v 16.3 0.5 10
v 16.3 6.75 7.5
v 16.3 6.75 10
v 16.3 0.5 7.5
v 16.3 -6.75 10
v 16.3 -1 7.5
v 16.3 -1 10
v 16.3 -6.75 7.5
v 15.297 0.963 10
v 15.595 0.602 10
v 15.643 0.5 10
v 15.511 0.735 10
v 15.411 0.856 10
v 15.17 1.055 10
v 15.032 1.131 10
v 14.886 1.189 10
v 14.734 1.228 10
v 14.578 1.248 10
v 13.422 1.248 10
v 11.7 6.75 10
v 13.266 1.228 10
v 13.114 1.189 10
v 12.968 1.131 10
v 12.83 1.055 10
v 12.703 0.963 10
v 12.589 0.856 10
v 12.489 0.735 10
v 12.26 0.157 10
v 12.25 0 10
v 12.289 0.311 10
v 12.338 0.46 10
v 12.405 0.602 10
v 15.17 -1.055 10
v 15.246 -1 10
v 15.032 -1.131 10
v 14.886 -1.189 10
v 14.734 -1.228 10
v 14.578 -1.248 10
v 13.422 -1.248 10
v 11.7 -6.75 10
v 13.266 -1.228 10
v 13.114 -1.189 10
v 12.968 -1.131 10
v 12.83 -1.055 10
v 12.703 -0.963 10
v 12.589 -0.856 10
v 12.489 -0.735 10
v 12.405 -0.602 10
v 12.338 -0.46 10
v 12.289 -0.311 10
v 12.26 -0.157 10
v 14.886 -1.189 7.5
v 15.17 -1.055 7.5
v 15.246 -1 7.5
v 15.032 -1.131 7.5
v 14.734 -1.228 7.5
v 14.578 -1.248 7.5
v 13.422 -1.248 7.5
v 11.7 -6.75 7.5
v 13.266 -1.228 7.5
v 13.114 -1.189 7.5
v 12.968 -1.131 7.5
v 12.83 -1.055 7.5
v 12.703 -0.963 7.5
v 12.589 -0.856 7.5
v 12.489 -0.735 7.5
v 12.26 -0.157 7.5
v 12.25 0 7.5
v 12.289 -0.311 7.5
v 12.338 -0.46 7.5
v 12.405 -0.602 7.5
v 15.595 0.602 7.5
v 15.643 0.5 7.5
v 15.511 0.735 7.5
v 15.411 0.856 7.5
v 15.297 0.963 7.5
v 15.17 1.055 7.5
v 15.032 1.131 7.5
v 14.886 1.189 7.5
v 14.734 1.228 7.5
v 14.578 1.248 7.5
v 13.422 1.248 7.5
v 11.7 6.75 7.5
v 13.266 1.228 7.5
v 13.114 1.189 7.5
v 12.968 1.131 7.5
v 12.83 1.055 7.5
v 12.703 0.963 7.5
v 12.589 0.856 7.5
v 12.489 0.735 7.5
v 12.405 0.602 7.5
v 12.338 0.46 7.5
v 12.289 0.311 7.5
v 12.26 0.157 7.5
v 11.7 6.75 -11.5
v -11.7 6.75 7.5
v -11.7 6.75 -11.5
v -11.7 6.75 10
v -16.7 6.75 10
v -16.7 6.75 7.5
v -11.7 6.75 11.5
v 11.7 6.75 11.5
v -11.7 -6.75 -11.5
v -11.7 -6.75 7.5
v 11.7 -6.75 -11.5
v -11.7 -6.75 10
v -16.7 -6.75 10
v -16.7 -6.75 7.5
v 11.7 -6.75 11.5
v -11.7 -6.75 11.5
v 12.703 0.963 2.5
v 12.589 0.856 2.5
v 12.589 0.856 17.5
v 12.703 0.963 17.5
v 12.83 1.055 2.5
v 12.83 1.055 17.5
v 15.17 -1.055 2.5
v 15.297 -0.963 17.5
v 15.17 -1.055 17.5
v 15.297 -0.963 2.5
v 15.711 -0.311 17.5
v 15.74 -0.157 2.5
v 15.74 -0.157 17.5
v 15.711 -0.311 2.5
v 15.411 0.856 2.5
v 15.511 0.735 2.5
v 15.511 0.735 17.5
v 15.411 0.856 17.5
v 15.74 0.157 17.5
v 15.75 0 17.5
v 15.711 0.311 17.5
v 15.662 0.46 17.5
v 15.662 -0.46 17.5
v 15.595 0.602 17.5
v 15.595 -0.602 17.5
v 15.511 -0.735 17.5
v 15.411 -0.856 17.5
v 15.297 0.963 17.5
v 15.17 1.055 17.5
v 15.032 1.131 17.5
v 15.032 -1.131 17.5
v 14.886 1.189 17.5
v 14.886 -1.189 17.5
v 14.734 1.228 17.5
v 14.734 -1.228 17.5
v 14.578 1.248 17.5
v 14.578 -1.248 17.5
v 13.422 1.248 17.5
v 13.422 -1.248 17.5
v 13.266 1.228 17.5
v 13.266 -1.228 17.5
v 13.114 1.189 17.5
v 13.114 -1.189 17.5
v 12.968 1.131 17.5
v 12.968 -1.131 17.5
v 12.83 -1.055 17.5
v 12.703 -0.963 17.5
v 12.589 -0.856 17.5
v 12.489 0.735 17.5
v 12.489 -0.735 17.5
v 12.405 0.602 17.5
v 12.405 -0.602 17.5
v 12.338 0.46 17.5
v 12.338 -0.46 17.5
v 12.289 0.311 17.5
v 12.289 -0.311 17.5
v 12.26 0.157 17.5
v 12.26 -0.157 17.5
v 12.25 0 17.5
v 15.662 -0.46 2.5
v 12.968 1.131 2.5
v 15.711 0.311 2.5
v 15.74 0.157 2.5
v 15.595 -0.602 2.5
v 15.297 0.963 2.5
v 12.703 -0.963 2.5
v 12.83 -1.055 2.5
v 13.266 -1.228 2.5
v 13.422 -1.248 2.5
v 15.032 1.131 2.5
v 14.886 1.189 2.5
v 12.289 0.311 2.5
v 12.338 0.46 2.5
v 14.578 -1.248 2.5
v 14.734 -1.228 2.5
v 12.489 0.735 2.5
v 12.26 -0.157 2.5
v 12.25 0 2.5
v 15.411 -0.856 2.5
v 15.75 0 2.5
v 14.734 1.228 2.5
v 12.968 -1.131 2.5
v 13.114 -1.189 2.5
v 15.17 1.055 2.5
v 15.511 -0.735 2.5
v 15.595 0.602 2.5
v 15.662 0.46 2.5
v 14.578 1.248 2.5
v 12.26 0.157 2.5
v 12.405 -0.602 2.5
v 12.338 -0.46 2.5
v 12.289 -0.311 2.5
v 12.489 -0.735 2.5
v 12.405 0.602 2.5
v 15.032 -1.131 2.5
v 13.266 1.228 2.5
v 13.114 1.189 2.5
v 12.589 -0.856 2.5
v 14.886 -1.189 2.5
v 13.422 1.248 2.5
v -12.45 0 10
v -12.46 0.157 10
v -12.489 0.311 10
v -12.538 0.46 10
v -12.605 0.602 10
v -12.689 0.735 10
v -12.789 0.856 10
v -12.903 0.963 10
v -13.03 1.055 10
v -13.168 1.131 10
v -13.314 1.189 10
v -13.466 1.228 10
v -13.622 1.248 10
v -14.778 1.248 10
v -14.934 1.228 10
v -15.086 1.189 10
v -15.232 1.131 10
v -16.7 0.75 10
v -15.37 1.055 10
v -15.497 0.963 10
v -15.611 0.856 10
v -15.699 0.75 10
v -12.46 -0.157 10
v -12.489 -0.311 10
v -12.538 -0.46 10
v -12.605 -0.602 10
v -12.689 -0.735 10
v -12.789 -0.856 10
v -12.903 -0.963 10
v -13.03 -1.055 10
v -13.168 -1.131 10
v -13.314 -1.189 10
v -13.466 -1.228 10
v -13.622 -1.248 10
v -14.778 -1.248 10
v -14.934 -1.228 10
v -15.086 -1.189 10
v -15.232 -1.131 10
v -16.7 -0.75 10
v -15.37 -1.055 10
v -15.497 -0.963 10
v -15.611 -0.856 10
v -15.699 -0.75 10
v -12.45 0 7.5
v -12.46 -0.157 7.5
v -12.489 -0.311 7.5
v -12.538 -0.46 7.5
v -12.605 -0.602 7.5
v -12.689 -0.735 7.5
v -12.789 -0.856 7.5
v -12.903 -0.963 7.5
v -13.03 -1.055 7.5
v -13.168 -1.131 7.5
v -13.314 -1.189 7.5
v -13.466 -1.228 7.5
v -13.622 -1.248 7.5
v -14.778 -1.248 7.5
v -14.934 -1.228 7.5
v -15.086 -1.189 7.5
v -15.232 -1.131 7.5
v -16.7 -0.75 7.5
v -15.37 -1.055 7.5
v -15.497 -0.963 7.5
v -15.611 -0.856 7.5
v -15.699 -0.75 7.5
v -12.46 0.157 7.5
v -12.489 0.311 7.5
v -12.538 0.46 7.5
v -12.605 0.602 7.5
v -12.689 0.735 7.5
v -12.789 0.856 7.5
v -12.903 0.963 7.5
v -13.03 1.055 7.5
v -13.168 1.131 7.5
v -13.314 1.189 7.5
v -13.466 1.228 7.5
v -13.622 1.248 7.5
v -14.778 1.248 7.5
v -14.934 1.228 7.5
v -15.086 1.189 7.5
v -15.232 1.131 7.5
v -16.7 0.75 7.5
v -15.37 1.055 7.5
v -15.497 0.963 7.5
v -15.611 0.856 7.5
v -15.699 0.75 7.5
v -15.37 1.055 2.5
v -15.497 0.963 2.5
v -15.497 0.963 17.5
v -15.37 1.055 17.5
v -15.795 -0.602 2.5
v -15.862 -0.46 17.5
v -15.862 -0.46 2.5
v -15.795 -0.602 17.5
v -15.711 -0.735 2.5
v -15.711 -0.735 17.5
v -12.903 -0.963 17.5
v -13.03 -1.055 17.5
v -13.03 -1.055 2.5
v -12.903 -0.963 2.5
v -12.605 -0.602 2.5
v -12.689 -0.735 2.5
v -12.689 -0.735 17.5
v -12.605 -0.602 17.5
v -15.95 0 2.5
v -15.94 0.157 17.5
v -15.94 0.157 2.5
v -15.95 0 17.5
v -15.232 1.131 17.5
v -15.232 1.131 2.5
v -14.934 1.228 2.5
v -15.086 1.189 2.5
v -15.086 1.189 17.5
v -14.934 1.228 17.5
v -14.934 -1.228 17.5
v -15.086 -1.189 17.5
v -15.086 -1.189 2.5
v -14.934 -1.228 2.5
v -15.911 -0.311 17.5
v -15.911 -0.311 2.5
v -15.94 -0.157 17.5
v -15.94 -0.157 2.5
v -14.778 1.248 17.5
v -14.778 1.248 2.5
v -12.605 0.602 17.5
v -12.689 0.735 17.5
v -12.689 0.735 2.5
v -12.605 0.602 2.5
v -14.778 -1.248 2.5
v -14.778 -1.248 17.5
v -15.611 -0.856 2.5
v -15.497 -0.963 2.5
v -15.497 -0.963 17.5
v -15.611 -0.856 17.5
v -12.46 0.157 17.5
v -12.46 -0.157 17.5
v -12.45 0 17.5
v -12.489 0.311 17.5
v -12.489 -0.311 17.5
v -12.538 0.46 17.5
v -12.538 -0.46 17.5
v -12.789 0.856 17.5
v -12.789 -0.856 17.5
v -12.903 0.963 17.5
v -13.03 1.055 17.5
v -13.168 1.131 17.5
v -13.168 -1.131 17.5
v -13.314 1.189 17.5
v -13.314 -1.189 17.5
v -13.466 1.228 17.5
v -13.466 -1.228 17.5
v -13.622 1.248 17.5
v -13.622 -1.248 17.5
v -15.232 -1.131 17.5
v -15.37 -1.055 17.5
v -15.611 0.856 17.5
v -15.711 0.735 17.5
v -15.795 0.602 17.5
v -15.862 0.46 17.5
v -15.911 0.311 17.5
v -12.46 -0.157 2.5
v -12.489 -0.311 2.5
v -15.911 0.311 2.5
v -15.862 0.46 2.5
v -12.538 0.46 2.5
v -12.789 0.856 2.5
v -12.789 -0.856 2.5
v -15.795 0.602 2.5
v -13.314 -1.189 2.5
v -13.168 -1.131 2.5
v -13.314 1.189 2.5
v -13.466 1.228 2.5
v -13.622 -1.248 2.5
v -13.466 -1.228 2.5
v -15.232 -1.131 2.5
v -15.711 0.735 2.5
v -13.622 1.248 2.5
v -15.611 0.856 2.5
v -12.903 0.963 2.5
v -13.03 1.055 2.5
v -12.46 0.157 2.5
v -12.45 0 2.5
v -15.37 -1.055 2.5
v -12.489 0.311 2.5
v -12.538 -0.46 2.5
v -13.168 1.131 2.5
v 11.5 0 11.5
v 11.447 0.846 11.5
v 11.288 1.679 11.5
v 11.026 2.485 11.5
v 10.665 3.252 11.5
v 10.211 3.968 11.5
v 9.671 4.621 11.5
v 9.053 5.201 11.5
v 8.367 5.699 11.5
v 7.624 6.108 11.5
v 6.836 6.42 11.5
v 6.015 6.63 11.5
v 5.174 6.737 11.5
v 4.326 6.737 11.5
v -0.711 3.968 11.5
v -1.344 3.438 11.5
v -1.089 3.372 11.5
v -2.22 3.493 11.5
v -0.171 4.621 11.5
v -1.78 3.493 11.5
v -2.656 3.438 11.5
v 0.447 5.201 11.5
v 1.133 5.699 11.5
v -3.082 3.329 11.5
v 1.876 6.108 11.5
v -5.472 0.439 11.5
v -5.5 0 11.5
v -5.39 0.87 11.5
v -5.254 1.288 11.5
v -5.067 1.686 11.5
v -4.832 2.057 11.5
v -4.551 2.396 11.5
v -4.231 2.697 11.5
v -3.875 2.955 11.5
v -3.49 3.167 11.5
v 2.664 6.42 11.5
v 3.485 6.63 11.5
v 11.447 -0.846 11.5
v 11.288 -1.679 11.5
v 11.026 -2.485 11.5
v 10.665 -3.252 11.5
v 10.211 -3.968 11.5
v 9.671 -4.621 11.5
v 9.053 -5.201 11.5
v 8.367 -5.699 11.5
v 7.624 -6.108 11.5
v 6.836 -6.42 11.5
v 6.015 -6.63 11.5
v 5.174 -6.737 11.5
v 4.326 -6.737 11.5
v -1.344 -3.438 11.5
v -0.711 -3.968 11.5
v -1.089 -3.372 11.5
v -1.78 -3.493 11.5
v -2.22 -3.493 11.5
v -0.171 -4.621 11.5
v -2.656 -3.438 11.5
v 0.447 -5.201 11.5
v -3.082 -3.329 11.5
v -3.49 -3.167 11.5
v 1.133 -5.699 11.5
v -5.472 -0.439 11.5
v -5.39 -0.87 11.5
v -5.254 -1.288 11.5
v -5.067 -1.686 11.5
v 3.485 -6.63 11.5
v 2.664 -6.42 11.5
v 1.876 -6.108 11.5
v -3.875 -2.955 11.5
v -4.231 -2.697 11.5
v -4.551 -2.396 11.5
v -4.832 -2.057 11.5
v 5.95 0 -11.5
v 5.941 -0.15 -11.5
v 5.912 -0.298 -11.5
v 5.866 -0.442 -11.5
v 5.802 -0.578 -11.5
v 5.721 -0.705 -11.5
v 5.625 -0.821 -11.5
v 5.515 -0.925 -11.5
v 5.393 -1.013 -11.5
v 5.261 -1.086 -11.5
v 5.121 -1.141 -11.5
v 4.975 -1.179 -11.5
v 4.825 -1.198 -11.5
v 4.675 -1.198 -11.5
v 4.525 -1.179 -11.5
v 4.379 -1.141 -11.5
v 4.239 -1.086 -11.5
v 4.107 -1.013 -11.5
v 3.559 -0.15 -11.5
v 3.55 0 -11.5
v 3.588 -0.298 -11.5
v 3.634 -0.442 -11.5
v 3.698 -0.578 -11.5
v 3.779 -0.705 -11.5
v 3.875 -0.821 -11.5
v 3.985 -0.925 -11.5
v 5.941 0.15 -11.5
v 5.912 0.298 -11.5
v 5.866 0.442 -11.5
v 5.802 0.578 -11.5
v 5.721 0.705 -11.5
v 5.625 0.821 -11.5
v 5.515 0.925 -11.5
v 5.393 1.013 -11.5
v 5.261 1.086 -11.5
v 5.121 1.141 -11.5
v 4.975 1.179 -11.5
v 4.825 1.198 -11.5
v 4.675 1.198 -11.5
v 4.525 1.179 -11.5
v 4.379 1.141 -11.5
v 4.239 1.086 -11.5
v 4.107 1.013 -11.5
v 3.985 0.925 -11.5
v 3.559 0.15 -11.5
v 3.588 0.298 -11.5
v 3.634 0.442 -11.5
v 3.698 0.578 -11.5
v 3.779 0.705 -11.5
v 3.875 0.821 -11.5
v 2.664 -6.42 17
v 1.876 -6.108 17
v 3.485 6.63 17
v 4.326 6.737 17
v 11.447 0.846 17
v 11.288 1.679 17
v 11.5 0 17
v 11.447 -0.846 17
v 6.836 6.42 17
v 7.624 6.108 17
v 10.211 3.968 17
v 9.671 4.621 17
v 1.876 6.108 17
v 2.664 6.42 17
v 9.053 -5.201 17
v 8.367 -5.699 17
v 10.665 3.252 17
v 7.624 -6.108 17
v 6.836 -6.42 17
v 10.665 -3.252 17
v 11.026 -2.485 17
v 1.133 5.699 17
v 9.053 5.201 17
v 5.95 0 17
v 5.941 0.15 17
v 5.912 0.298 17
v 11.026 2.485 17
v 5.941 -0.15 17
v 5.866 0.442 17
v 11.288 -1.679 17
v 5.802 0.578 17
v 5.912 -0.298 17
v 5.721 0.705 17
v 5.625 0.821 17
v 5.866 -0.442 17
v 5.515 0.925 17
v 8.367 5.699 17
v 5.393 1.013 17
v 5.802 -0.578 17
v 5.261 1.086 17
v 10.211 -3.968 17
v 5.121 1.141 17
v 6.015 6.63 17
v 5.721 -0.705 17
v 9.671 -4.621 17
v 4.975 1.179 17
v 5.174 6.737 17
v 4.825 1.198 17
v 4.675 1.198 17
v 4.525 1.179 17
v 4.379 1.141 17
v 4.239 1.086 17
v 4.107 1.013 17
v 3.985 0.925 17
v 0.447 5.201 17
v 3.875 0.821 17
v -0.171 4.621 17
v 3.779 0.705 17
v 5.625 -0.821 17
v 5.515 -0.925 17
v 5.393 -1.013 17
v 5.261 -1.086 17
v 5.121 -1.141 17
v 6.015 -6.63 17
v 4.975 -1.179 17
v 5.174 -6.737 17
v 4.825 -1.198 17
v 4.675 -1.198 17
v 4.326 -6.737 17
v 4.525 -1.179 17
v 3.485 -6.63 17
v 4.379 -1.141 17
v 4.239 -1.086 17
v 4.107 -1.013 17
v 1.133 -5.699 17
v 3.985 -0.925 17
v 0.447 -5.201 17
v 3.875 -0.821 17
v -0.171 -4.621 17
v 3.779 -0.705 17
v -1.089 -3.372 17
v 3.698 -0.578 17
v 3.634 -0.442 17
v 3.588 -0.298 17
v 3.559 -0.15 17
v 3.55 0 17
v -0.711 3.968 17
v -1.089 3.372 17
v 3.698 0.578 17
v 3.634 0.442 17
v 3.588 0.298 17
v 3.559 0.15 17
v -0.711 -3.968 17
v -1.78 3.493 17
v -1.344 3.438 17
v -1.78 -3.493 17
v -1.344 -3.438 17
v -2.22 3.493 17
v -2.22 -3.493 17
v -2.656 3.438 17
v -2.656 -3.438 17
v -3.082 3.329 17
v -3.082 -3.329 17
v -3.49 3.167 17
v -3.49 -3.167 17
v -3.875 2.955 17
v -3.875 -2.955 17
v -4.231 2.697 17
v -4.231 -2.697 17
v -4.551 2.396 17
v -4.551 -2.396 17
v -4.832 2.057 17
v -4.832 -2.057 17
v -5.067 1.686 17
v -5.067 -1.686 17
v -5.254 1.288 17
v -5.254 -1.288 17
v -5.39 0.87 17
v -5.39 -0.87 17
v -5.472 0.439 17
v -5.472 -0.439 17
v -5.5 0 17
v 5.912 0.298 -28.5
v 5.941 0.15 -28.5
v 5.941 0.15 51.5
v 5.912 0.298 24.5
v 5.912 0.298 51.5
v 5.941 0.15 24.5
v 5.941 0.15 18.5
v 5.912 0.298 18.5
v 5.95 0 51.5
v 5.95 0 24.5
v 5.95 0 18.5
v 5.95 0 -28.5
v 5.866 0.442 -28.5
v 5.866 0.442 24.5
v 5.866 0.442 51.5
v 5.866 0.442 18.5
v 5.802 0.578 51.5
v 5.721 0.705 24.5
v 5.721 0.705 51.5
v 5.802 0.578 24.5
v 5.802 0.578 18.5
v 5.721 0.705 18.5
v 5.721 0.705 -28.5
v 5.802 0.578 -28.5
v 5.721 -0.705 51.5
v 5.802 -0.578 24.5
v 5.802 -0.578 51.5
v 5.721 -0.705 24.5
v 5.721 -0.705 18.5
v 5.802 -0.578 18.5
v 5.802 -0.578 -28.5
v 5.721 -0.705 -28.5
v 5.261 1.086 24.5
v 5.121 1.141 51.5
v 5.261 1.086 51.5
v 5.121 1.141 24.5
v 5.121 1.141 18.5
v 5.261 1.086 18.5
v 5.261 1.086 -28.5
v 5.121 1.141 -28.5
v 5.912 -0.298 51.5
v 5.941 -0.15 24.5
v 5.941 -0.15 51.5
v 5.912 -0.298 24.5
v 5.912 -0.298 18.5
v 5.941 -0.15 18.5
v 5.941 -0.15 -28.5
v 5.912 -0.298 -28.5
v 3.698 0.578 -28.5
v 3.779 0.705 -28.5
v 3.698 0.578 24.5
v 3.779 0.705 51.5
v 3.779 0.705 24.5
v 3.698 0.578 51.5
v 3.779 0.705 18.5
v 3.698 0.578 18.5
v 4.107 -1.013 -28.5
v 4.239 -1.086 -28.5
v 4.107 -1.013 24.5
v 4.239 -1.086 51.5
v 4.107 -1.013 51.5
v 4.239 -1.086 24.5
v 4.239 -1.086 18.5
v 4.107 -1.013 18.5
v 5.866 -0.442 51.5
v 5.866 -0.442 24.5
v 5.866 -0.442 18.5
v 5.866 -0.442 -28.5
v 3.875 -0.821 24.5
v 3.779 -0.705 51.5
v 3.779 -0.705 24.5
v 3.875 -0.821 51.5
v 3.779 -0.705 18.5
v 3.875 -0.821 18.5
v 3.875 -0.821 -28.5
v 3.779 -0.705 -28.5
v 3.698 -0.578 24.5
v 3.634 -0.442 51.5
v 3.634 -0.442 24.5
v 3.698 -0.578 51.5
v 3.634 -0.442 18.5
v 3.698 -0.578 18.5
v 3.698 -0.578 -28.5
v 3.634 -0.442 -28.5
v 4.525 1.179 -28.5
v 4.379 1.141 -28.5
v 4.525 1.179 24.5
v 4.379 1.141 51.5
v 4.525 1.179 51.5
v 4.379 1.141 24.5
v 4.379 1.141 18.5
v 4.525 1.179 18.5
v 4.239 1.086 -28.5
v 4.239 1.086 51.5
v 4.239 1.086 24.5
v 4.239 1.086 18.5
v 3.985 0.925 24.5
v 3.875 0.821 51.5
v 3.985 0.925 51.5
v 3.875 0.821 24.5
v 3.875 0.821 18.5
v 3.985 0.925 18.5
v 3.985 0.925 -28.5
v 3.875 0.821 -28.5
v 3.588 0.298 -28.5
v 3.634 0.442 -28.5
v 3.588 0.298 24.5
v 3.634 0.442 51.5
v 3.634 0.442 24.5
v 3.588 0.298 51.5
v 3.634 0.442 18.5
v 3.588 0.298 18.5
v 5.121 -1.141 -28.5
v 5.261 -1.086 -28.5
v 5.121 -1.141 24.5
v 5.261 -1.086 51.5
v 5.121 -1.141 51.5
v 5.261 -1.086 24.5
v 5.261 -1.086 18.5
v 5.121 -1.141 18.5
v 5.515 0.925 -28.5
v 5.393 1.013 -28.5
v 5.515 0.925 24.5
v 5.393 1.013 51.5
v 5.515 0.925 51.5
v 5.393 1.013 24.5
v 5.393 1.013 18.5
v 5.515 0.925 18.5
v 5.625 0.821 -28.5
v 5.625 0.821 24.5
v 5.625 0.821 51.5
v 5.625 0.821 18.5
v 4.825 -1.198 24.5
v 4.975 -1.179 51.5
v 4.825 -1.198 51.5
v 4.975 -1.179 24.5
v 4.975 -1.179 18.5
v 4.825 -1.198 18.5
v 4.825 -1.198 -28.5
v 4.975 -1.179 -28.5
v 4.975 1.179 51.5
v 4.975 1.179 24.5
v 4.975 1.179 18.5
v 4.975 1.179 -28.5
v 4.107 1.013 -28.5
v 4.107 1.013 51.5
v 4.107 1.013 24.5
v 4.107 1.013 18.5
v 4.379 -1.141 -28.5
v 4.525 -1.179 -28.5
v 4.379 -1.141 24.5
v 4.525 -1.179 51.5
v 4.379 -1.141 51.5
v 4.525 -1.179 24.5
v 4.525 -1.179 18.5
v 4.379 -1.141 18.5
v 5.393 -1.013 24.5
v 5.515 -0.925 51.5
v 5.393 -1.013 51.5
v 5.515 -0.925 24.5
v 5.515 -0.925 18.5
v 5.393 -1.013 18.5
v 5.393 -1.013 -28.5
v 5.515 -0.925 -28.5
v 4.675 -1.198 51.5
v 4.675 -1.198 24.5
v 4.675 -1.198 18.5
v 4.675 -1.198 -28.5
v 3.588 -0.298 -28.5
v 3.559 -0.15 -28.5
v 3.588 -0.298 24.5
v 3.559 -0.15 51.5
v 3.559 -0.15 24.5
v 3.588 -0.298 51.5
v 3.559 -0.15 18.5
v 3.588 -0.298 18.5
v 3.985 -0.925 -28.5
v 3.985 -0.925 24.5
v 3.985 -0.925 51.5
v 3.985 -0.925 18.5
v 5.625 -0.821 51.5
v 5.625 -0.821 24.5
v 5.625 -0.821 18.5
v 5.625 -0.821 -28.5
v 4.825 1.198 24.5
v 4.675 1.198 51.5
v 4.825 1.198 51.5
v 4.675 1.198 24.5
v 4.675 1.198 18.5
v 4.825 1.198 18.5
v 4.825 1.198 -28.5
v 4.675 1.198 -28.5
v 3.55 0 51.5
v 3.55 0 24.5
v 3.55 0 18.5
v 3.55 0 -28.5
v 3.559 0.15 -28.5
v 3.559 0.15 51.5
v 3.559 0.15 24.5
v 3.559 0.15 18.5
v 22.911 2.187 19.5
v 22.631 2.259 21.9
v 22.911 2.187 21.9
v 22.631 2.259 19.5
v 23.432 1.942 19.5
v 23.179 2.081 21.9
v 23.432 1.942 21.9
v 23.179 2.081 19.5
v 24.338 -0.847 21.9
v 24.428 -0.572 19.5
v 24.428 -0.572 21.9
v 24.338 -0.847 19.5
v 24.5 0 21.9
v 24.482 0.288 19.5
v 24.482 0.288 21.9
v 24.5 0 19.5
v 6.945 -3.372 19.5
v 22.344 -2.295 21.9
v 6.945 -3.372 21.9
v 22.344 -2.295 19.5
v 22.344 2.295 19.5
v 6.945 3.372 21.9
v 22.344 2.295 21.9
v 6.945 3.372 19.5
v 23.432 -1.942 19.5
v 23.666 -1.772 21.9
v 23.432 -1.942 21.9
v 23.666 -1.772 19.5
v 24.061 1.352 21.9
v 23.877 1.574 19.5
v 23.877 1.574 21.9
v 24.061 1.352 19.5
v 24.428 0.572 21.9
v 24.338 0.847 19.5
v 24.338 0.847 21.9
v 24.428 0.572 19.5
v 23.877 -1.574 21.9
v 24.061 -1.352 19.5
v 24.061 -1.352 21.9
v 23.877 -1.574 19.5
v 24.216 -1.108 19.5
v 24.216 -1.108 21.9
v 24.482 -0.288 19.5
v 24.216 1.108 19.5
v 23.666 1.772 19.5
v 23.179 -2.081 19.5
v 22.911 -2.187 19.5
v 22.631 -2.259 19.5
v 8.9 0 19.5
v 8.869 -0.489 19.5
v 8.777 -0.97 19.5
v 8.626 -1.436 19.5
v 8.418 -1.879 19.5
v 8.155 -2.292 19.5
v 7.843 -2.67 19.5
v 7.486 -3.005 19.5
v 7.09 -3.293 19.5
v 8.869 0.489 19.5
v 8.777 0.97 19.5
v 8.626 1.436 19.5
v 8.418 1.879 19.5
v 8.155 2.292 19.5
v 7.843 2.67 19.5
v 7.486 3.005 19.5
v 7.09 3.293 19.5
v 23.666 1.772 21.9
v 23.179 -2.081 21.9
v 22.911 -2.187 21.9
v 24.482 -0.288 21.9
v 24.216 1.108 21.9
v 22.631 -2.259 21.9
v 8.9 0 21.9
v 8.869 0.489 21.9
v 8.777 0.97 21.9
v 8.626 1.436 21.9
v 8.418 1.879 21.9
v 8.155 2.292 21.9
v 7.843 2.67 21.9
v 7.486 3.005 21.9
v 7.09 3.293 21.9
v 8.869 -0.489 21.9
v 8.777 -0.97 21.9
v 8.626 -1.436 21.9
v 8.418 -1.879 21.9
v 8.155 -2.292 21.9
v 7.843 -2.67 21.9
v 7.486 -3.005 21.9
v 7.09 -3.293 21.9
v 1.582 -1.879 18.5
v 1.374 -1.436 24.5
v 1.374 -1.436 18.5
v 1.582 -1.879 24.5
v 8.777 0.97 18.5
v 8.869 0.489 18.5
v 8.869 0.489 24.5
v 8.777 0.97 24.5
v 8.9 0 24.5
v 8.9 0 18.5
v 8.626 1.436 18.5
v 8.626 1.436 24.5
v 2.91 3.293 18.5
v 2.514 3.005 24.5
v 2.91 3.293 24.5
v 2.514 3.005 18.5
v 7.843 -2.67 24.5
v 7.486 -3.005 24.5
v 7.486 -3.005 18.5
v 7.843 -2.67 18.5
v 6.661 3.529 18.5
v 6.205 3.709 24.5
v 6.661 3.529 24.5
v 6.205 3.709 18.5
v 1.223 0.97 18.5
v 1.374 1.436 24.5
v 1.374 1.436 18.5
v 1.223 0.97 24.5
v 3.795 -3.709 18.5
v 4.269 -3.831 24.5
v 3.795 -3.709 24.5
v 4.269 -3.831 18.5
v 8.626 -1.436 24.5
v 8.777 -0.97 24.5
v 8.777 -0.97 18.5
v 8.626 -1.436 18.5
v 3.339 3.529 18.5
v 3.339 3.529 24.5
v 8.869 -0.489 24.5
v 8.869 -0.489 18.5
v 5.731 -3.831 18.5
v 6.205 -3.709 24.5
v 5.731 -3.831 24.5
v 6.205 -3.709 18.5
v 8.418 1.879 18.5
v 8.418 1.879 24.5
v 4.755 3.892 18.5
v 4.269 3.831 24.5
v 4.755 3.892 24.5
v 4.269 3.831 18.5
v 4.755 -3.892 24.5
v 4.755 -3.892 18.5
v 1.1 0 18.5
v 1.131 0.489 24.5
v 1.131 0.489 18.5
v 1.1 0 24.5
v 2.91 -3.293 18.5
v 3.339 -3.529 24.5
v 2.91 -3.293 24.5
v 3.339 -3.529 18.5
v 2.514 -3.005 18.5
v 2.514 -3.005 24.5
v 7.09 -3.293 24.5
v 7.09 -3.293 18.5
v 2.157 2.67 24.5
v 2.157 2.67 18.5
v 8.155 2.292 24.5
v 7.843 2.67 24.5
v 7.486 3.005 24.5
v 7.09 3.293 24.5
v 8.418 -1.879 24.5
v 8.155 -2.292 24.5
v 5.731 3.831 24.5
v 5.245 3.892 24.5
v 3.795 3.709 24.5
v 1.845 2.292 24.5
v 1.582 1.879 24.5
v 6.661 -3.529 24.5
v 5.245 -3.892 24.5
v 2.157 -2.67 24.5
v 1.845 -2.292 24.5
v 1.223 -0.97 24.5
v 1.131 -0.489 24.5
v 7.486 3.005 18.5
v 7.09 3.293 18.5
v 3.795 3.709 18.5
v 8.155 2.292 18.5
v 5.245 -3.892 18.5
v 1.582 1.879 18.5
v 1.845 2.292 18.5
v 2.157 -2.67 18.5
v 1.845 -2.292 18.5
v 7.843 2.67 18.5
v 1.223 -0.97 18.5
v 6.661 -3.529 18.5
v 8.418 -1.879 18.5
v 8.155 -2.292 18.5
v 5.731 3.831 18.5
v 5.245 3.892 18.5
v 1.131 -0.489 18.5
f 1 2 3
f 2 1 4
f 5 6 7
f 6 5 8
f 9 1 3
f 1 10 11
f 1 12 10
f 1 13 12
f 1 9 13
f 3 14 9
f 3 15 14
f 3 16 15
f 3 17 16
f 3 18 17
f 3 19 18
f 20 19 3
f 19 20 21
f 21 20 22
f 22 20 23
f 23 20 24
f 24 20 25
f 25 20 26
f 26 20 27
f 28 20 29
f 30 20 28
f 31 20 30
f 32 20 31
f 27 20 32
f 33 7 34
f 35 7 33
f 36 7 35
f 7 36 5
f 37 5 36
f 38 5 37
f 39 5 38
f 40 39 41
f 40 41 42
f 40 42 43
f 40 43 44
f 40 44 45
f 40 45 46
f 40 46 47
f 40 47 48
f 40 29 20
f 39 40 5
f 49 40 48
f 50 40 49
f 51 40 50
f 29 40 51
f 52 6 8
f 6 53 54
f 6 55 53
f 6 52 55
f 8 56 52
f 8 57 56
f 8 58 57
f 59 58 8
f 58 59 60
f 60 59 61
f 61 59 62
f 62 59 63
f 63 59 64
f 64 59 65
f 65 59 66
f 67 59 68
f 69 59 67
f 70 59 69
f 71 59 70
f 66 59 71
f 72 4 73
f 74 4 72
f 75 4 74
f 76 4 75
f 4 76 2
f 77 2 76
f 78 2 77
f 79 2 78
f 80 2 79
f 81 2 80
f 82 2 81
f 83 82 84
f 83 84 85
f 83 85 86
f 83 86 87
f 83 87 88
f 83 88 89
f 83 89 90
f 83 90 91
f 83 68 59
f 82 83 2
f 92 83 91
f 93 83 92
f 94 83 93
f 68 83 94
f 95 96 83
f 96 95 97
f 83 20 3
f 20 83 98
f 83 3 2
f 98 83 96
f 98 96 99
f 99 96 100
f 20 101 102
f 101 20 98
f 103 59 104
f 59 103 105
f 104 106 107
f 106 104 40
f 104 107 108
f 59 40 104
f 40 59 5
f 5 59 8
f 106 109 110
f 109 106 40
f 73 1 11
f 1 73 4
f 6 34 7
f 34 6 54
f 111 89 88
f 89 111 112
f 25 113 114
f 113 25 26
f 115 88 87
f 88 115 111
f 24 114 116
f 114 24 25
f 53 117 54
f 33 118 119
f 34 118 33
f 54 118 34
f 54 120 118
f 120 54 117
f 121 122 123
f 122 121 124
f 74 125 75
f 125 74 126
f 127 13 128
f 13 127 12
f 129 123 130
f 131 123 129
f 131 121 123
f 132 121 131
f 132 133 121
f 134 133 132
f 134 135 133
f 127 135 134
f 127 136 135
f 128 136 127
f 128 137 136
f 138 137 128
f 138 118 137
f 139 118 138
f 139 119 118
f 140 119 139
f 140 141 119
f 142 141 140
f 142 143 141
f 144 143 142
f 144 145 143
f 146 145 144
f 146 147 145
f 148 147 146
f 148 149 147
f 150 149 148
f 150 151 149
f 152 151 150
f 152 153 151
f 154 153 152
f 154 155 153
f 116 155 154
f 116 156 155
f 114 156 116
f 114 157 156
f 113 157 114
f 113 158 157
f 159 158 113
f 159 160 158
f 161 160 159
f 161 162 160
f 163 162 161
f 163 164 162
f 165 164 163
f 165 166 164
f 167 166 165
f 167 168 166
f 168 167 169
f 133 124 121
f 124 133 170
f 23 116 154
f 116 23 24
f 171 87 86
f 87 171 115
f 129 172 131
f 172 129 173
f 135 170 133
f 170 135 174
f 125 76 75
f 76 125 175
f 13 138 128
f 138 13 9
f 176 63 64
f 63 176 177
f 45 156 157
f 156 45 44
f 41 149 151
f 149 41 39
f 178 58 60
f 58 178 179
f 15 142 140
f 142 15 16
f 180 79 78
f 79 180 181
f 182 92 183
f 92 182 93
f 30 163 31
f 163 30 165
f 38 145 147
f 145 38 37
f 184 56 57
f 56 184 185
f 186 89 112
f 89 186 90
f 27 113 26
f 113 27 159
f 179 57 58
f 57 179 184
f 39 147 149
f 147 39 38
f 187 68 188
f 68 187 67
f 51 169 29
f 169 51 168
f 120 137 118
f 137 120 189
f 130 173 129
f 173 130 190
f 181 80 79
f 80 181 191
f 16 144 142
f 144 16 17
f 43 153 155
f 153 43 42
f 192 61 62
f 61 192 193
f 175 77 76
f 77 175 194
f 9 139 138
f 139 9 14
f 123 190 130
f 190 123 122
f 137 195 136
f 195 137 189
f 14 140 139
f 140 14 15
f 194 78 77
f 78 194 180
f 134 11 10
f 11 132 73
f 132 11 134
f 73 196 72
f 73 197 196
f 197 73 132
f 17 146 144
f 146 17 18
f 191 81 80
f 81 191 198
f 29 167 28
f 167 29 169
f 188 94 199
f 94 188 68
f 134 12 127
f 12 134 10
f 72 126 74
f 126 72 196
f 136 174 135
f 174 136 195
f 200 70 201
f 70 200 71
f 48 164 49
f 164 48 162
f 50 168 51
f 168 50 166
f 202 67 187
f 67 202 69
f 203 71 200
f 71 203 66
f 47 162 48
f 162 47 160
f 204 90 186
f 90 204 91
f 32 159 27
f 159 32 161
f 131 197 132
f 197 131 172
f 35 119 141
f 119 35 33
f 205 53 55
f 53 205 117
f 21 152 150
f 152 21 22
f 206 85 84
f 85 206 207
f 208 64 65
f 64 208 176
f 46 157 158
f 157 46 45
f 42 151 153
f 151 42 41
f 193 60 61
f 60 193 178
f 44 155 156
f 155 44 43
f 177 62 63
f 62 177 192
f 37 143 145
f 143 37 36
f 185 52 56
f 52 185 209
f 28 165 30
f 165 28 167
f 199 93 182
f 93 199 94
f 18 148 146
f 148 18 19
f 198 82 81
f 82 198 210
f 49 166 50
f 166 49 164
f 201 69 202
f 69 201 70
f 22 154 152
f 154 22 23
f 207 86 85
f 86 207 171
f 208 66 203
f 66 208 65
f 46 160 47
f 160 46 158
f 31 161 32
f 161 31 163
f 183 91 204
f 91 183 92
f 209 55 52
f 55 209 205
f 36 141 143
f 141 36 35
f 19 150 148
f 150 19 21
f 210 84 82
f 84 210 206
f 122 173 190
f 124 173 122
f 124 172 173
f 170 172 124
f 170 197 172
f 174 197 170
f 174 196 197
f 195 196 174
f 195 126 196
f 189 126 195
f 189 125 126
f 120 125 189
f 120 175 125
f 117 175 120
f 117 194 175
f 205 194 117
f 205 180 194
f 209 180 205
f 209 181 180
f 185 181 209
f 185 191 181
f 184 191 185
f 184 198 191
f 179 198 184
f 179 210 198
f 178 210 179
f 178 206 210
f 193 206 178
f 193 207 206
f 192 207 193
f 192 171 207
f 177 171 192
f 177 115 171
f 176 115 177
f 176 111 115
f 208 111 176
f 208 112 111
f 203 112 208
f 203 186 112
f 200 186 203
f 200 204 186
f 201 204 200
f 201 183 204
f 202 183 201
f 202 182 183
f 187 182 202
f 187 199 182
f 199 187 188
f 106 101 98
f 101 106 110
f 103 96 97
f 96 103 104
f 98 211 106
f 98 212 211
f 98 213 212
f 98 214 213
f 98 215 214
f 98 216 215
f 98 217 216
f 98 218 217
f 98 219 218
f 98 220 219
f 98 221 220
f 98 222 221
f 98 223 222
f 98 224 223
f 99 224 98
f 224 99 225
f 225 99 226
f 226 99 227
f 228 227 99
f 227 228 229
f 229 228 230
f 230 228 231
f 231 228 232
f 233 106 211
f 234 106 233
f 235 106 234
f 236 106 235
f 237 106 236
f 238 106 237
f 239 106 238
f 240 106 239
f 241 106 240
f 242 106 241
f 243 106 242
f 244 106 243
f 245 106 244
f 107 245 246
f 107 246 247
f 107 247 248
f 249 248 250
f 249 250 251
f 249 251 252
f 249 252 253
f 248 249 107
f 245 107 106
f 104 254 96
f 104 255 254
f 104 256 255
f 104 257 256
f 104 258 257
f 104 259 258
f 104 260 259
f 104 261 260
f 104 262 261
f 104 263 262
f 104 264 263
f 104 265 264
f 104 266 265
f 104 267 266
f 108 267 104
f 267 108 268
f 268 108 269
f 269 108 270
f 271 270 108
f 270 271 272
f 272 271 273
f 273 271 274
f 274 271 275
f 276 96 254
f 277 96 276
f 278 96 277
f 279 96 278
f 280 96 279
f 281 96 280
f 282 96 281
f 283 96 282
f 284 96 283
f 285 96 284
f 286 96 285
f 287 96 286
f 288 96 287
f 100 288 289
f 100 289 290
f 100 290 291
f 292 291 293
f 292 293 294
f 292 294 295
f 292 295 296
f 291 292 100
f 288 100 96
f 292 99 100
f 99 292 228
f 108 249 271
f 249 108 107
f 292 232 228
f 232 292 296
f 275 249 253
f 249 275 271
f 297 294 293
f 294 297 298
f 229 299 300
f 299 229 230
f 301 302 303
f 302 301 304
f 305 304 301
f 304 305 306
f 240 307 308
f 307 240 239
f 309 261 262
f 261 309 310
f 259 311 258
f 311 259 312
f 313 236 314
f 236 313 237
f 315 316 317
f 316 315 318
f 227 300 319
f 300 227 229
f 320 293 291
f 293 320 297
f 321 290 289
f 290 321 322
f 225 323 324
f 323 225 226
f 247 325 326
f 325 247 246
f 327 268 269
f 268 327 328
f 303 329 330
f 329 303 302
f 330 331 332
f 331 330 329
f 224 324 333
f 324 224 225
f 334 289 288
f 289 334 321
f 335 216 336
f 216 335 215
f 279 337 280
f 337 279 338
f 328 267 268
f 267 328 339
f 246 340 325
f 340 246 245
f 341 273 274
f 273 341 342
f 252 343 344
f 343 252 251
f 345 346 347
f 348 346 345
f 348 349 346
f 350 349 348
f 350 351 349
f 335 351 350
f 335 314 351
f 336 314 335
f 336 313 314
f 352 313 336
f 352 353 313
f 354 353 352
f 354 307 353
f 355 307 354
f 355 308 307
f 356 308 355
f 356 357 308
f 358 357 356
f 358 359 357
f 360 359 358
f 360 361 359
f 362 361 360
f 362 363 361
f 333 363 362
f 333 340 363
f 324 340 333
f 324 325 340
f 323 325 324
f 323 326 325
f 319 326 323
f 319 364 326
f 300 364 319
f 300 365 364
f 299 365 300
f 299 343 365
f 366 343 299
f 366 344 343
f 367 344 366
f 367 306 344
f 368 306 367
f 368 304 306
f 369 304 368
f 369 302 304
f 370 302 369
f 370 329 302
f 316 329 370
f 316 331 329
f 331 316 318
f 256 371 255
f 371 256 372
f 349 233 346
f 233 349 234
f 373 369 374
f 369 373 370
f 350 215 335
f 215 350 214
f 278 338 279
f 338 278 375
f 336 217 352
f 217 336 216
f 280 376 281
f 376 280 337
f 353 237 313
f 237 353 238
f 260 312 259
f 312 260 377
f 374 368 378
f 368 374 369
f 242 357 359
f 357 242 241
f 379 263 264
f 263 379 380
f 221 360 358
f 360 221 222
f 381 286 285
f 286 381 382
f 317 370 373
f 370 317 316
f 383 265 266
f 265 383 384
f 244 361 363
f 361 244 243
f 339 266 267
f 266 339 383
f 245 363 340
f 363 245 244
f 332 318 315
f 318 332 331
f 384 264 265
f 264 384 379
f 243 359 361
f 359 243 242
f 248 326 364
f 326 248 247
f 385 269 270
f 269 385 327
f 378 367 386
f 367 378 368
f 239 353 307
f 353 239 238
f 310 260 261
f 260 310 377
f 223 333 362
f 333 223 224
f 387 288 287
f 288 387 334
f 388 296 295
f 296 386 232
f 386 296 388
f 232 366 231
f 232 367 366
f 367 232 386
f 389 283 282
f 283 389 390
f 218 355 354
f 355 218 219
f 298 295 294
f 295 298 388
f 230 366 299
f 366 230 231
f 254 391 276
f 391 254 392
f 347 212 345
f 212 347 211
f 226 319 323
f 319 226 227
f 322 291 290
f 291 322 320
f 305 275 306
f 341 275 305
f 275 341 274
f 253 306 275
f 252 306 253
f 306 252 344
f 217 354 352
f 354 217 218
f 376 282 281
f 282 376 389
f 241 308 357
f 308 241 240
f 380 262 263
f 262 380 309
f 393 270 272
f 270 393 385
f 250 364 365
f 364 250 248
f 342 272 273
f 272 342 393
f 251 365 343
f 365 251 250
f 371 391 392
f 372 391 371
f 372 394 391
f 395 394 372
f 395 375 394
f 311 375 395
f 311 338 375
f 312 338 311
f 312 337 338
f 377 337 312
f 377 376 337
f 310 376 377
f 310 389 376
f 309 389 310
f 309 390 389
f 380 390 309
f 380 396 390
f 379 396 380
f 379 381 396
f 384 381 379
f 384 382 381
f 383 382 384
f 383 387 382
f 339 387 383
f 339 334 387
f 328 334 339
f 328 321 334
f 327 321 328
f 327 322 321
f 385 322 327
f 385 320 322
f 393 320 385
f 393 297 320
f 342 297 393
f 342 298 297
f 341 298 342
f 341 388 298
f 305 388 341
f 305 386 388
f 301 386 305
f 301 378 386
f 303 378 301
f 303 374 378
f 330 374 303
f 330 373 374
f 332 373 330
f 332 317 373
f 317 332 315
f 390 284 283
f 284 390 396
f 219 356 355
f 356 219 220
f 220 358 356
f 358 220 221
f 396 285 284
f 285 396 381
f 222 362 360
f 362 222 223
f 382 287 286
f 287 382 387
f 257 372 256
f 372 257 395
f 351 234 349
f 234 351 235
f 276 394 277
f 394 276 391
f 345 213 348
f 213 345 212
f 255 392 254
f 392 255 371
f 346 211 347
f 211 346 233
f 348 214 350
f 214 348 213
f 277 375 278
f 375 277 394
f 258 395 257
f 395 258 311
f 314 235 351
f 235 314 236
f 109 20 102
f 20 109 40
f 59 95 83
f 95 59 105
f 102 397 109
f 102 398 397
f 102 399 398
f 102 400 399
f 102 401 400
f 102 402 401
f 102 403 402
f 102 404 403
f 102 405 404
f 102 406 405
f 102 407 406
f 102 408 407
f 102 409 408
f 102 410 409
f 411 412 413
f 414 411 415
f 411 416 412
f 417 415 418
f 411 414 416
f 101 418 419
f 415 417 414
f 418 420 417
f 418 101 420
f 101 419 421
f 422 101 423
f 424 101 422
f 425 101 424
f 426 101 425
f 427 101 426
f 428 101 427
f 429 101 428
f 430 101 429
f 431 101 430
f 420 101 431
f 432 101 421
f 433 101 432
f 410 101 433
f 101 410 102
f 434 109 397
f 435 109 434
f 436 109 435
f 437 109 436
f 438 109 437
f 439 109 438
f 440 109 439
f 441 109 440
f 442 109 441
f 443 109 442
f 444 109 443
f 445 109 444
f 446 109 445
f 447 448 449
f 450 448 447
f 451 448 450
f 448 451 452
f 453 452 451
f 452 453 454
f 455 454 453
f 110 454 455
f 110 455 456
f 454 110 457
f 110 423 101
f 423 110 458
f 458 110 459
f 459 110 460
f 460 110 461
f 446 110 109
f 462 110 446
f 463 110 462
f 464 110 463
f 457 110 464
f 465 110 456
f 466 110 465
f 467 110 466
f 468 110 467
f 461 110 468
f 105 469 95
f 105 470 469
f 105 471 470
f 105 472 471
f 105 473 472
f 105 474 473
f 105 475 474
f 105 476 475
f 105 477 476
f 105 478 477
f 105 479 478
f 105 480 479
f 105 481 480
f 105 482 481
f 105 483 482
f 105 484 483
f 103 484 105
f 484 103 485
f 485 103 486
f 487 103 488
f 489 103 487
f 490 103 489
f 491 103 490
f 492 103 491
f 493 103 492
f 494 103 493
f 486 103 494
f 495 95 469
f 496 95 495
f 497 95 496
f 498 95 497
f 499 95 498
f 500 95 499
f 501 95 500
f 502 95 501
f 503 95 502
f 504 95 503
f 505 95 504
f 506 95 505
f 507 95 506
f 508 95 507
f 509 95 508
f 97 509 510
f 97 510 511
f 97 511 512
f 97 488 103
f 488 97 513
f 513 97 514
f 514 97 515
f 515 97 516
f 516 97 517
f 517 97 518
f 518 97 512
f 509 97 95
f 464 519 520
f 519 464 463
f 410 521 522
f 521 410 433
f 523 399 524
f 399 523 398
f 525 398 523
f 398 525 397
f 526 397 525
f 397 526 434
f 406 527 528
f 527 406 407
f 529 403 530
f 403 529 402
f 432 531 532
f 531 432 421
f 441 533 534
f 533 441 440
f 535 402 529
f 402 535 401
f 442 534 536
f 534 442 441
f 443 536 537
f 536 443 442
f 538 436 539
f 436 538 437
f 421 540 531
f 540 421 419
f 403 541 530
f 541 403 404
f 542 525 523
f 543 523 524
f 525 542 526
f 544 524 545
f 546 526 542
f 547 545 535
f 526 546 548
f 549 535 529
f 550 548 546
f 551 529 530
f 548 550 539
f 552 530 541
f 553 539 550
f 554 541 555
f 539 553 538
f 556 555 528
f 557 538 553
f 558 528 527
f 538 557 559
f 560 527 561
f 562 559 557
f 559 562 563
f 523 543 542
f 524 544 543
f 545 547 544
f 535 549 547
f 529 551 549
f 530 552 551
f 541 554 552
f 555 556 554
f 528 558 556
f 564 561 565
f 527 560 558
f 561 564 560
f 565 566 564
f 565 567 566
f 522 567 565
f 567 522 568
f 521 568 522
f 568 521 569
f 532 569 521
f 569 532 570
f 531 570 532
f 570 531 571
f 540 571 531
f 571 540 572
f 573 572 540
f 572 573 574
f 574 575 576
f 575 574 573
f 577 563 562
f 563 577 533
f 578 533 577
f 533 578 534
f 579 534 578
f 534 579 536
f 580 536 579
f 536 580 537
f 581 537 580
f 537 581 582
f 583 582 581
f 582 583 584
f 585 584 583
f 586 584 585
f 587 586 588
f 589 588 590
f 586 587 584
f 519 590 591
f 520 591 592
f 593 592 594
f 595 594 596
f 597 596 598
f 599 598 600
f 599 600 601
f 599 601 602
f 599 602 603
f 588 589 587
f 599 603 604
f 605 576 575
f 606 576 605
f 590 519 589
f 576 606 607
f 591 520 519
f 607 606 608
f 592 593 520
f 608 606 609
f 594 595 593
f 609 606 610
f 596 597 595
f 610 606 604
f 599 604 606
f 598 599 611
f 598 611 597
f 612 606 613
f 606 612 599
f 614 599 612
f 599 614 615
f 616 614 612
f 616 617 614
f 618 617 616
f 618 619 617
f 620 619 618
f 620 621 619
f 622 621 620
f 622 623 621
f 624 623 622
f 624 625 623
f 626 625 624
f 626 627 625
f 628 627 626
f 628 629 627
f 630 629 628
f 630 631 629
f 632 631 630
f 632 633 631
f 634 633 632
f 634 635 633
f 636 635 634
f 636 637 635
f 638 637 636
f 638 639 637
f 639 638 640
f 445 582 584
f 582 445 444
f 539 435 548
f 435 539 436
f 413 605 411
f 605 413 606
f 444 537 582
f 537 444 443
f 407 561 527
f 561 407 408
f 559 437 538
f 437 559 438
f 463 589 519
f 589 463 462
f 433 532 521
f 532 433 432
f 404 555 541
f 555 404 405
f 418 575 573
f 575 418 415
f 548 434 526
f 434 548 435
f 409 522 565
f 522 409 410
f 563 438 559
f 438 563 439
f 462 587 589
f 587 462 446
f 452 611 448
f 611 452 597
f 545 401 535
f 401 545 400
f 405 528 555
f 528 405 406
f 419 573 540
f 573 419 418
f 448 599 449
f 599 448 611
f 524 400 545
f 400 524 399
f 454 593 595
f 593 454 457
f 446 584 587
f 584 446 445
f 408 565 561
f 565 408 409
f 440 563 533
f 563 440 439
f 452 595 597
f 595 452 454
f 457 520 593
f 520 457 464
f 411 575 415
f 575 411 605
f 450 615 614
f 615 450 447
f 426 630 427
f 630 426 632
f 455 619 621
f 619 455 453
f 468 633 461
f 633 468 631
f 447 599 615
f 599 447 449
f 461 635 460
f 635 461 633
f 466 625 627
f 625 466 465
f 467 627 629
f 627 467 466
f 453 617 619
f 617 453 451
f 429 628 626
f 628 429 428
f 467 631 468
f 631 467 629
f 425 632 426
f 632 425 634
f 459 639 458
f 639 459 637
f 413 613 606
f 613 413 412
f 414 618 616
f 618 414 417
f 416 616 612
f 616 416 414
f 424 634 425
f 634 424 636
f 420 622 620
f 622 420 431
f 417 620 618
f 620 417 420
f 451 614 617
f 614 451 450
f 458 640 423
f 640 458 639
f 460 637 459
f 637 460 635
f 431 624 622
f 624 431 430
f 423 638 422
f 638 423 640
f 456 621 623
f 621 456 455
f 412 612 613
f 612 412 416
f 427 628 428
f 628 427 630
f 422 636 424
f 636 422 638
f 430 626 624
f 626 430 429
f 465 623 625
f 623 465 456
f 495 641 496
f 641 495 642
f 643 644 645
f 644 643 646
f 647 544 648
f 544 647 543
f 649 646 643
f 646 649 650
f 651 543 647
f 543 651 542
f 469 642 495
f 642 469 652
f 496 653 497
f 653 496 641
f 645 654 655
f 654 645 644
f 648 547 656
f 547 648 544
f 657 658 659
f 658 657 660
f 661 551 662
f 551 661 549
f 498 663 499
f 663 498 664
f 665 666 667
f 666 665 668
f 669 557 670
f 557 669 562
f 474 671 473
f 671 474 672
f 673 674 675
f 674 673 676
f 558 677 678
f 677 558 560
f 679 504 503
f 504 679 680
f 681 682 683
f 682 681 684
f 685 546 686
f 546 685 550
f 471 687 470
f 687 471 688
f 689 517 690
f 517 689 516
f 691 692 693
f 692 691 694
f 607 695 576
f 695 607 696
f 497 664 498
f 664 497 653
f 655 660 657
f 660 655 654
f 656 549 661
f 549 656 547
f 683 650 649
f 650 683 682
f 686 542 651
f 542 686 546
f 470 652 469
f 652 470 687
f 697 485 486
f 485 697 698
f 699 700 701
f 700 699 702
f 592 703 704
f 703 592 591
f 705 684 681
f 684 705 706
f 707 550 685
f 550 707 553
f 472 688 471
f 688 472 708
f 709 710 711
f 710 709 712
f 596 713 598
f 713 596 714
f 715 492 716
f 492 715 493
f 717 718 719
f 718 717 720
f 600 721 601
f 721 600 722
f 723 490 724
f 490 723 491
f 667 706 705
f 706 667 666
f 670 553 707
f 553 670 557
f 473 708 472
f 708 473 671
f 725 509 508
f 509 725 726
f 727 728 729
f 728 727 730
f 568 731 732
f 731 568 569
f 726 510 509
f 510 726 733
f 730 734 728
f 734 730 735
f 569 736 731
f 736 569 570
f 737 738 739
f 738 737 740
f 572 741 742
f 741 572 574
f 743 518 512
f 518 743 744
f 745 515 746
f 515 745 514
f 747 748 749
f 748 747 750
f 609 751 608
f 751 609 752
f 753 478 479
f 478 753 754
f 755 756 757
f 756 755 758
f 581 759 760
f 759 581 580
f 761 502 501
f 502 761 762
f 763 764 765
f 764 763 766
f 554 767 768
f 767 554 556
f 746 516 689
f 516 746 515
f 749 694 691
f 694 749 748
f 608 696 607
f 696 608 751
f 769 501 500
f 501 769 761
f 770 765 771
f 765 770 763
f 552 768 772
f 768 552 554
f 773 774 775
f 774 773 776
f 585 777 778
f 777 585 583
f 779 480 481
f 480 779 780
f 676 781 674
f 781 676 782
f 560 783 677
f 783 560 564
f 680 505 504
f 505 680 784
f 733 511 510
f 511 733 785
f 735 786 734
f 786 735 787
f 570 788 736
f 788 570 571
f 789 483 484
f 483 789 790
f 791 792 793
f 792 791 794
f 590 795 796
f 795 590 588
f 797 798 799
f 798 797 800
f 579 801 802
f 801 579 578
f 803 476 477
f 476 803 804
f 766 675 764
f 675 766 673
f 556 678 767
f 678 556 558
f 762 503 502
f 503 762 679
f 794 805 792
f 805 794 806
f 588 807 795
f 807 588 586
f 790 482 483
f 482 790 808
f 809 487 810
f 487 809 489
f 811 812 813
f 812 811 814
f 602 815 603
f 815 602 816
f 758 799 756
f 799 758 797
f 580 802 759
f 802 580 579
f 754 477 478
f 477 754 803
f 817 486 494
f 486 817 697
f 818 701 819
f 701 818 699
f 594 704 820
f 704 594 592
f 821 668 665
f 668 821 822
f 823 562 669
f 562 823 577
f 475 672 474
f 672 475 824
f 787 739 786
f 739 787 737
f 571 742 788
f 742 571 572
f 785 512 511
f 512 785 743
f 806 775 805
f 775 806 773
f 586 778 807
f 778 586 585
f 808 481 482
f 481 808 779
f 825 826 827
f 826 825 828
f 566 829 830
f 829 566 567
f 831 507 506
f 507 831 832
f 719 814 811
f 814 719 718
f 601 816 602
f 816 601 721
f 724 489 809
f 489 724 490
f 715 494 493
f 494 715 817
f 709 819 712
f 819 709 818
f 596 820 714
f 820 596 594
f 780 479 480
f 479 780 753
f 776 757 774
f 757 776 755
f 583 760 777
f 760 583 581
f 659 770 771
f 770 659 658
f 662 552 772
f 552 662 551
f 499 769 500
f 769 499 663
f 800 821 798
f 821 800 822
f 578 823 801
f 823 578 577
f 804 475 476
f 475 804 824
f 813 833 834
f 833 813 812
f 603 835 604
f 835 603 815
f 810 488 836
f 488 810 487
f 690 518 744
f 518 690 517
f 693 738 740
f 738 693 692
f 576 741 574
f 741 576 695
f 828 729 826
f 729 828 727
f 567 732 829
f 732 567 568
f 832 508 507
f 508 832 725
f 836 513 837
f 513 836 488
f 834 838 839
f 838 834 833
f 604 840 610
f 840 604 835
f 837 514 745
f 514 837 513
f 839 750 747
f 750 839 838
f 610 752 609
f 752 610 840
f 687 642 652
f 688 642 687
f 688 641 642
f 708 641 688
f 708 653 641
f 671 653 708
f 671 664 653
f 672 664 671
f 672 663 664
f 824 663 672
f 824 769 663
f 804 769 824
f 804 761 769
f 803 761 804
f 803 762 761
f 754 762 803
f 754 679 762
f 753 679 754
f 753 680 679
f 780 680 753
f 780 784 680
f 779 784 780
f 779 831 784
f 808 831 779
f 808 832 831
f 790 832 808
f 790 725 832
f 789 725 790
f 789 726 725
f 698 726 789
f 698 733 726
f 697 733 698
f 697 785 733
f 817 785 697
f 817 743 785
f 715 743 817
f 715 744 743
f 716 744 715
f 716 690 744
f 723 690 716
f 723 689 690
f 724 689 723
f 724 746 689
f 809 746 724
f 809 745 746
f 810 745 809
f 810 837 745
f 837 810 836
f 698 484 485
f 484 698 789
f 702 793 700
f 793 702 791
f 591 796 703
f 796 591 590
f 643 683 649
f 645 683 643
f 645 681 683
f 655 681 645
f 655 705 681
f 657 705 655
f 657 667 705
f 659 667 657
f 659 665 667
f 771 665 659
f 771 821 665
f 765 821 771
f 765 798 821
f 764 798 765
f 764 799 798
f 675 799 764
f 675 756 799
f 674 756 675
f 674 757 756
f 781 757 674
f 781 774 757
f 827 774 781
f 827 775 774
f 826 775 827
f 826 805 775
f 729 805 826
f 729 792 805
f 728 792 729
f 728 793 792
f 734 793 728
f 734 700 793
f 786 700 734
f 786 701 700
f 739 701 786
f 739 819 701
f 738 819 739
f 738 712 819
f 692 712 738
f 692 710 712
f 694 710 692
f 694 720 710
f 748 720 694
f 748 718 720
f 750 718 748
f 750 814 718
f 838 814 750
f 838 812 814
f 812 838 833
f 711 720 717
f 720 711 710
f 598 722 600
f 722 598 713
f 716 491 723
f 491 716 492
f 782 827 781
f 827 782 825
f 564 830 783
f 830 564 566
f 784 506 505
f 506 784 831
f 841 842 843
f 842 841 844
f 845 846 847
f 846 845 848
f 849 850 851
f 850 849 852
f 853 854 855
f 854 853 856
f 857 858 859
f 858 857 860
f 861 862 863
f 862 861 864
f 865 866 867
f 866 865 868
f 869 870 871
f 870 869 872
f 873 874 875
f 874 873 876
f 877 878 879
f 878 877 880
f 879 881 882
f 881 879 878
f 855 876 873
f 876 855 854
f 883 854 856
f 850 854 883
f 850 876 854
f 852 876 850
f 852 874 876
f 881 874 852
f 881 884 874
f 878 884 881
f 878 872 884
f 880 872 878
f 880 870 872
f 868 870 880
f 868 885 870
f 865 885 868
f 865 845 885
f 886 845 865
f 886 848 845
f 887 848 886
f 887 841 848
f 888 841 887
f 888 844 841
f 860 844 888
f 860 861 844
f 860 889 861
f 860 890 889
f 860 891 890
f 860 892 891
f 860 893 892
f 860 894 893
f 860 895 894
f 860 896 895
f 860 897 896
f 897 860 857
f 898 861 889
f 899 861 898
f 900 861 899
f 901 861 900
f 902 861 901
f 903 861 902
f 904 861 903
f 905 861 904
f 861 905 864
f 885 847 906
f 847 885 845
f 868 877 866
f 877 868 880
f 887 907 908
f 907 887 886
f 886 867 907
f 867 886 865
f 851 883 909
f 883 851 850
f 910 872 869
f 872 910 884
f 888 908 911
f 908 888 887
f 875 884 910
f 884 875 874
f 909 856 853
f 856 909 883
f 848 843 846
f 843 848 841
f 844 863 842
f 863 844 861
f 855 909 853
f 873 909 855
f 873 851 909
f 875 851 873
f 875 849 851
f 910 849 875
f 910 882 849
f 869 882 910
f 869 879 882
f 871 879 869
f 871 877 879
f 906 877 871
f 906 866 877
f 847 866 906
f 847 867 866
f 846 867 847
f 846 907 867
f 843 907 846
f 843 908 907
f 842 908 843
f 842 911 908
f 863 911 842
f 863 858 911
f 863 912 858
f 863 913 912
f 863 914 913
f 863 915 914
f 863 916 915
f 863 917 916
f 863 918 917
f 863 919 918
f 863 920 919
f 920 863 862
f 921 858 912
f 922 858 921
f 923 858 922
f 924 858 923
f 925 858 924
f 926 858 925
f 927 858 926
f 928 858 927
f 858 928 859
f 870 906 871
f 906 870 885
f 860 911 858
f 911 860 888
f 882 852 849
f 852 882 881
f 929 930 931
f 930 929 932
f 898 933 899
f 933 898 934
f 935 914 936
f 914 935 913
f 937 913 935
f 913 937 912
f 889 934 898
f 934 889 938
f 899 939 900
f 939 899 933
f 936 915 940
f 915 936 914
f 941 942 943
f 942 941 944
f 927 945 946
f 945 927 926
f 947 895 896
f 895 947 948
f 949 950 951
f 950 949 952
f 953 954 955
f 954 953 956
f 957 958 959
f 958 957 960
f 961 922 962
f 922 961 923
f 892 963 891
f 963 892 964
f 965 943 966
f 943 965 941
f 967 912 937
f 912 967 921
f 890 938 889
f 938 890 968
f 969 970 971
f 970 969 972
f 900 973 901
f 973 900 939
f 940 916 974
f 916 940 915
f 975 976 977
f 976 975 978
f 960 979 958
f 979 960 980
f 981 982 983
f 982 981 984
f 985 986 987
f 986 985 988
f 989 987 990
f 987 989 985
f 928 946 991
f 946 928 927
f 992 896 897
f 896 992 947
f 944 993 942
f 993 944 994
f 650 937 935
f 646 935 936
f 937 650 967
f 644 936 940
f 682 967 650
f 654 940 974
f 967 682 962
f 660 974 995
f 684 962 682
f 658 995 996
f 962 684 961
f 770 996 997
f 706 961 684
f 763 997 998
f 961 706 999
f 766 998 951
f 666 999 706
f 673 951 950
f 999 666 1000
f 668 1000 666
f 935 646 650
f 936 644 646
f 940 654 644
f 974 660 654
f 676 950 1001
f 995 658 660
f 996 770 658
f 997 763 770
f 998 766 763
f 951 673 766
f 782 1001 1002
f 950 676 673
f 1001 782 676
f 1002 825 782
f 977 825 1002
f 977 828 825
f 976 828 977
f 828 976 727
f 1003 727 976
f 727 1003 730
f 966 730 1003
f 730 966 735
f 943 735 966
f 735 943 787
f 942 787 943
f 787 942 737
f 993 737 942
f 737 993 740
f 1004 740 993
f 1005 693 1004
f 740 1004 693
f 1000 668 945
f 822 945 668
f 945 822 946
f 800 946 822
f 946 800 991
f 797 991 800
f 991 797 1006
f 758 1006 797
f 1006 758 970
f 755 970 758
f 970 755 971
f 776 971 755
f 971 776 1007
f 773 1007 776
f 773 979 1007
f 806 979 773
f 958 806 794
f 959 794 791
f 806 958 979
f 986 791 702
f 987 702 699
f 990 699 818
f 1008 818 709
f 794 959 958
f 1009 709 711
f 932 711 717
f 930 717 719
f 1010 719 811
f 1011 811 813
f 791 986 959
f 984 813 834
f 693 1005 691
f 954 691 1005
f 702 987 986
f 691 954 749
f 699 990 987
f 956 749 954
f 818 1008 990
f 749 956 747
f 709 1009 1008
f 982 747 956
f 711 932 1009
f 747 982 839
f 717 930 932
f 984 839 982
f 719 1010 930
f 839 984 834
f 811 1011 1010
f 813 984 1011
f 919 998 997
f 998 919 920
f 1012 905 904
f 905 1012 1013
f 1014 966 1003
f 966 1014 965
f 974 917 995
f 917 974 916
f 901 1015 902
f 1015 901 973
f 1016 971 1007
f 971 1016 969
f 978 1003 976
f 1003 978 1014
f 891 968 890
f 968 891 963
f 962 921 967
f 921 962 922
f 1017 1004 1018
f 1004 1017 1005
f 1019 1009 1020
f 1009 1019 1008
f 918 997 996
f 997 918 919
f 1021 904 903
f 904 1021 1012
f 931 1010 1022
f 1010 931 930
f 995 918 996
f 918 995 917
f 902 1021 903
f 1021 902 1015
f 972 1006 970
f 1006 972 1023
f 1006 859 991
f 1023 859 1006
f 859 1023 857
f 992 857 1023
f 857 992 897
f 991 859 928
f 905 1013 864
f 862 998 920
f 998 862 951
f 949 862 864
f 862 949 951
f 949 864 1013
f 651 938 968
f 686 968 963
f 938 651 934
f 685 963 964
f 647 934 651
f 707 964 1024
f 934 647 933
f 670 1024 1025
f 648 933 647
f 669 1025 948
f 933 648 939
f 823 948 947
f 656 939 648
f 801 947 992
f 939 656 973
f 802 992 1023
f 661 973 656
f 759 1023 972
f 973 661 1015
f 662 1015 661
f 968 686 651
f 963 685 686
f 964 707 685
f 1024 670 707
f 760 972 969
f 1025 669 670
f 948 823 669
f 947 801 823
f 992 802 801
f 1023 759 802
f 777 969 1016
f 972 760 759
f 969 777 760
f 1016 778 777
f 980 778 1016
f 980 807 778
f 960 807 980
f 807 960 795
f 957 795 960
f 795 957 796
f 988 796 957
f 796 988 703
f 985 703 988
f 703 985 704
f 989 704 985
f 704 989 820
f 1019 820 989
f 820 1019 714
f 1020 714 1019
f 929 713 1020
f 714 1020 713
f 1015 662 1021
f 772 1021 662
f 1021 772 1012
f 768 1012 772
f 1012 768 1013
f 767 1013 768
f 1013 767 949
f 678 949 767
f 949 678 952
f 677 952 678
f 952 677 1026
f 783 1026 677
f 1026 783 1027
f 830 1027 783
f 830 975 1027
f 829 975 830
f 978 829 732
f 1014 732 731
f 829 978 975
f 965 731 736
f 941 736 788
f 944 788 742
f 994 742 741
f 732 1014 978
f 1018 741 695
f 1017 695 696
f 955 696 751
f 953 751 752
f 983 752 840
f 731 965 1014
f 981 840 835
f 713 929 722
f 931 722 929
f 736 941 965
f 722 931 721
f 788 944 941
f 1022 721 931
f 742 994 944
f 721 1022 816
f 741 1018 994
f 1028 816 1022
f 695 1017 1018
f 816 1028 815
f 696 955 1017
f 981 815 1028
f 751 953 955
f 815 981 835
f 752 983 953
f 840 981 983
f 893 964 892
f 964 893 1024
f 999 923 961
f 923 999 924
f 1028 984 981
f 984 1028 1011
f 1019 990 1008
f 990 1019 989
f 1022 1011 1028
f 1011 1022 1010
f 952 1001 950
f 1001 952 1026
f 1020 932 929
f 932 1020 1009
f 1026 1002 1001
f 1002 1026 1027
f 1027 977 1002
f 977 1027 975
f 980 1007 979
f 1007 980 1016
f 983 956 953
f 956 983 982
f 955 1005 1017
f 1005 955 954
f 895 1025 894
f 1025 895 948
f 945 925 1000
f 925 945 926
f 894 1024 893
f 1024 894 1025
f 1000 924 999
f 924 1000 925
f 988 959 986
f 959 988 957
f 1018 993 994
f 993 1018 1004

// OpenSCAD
// simplified model of the tower-pro mg90 micro-servo

width = 13.5;
length = 23;

$fn=50;

servo();
translate([5,0,19.5]) axisMount();

module servo(){
	union(){
		translate([-length/2-0.2, -width/2, -11.5]){
			//body
			union(){
				cube([length+0.4, width, length]);
				translate([length, 0, 19]){
					union(){
						difference(){
							cube([5, width, 2.5]);
							
							translate([3, 5.75, -1]) cube([4, 1.5, 4]);						
						}
						#translate([0.8, 0, 0]) hull(){
							translate([2.4, width/2, -5]){
								cylinder(h=15, r=1.25);
							}							
							translate([1.4, width/2, -5]){
								cylinder(h=15, r=1.25);
							}
						}						
					}
				}
				translate([-5, 0, 19]){
					union(){
						difference(){
							cube([5, width, 2.5]);

							translate([-2, 6, -1]) cube([4, 1.5, 4]);												
						}
						#hull(){
							translate([2, width/2, -5]){
								cylinder(h=15, r=1.25);
							}								
							translate([3, width/2, -5]){
								cylinder(h=15, r=1.25);
							}
						}
					}
				}					
			}

		}
		translate([length/2-width/2, 0, length/2]){
			union(){
				cylinder(h=gearHeight, r=width/2);
				translate([-length/4-1, 0, 0]){
					cylinder(h=gearHeight, r=3.5);
				}
				translate([0, 0, -40]){
					#cylinder(h=80, r=1.2);
				}
			}
		}
	}
	gearHeight = 5.5;
}


//	Mounting lever of micro servo tower-pro MG90
radBase1 = 2.3;
radBase2 = 3.5;
heightBase = 2.4;

radAxis = 3.9;
heightAxis = 6;

module axisMount(){
	difference(){
		union(){
			// base of the lever
			hull(){
				cylinder(r=radBase2, h=heightBase);				
				translate([23-radBase1-radBase2,0,0]){
					cylinder(r=radBase1, h=heightBase);
				}
			}
			// axis
			translate([0,0,-1]){
				cylinder(r=radAxis, h=heightAxis);
			}
		}
	}
}
